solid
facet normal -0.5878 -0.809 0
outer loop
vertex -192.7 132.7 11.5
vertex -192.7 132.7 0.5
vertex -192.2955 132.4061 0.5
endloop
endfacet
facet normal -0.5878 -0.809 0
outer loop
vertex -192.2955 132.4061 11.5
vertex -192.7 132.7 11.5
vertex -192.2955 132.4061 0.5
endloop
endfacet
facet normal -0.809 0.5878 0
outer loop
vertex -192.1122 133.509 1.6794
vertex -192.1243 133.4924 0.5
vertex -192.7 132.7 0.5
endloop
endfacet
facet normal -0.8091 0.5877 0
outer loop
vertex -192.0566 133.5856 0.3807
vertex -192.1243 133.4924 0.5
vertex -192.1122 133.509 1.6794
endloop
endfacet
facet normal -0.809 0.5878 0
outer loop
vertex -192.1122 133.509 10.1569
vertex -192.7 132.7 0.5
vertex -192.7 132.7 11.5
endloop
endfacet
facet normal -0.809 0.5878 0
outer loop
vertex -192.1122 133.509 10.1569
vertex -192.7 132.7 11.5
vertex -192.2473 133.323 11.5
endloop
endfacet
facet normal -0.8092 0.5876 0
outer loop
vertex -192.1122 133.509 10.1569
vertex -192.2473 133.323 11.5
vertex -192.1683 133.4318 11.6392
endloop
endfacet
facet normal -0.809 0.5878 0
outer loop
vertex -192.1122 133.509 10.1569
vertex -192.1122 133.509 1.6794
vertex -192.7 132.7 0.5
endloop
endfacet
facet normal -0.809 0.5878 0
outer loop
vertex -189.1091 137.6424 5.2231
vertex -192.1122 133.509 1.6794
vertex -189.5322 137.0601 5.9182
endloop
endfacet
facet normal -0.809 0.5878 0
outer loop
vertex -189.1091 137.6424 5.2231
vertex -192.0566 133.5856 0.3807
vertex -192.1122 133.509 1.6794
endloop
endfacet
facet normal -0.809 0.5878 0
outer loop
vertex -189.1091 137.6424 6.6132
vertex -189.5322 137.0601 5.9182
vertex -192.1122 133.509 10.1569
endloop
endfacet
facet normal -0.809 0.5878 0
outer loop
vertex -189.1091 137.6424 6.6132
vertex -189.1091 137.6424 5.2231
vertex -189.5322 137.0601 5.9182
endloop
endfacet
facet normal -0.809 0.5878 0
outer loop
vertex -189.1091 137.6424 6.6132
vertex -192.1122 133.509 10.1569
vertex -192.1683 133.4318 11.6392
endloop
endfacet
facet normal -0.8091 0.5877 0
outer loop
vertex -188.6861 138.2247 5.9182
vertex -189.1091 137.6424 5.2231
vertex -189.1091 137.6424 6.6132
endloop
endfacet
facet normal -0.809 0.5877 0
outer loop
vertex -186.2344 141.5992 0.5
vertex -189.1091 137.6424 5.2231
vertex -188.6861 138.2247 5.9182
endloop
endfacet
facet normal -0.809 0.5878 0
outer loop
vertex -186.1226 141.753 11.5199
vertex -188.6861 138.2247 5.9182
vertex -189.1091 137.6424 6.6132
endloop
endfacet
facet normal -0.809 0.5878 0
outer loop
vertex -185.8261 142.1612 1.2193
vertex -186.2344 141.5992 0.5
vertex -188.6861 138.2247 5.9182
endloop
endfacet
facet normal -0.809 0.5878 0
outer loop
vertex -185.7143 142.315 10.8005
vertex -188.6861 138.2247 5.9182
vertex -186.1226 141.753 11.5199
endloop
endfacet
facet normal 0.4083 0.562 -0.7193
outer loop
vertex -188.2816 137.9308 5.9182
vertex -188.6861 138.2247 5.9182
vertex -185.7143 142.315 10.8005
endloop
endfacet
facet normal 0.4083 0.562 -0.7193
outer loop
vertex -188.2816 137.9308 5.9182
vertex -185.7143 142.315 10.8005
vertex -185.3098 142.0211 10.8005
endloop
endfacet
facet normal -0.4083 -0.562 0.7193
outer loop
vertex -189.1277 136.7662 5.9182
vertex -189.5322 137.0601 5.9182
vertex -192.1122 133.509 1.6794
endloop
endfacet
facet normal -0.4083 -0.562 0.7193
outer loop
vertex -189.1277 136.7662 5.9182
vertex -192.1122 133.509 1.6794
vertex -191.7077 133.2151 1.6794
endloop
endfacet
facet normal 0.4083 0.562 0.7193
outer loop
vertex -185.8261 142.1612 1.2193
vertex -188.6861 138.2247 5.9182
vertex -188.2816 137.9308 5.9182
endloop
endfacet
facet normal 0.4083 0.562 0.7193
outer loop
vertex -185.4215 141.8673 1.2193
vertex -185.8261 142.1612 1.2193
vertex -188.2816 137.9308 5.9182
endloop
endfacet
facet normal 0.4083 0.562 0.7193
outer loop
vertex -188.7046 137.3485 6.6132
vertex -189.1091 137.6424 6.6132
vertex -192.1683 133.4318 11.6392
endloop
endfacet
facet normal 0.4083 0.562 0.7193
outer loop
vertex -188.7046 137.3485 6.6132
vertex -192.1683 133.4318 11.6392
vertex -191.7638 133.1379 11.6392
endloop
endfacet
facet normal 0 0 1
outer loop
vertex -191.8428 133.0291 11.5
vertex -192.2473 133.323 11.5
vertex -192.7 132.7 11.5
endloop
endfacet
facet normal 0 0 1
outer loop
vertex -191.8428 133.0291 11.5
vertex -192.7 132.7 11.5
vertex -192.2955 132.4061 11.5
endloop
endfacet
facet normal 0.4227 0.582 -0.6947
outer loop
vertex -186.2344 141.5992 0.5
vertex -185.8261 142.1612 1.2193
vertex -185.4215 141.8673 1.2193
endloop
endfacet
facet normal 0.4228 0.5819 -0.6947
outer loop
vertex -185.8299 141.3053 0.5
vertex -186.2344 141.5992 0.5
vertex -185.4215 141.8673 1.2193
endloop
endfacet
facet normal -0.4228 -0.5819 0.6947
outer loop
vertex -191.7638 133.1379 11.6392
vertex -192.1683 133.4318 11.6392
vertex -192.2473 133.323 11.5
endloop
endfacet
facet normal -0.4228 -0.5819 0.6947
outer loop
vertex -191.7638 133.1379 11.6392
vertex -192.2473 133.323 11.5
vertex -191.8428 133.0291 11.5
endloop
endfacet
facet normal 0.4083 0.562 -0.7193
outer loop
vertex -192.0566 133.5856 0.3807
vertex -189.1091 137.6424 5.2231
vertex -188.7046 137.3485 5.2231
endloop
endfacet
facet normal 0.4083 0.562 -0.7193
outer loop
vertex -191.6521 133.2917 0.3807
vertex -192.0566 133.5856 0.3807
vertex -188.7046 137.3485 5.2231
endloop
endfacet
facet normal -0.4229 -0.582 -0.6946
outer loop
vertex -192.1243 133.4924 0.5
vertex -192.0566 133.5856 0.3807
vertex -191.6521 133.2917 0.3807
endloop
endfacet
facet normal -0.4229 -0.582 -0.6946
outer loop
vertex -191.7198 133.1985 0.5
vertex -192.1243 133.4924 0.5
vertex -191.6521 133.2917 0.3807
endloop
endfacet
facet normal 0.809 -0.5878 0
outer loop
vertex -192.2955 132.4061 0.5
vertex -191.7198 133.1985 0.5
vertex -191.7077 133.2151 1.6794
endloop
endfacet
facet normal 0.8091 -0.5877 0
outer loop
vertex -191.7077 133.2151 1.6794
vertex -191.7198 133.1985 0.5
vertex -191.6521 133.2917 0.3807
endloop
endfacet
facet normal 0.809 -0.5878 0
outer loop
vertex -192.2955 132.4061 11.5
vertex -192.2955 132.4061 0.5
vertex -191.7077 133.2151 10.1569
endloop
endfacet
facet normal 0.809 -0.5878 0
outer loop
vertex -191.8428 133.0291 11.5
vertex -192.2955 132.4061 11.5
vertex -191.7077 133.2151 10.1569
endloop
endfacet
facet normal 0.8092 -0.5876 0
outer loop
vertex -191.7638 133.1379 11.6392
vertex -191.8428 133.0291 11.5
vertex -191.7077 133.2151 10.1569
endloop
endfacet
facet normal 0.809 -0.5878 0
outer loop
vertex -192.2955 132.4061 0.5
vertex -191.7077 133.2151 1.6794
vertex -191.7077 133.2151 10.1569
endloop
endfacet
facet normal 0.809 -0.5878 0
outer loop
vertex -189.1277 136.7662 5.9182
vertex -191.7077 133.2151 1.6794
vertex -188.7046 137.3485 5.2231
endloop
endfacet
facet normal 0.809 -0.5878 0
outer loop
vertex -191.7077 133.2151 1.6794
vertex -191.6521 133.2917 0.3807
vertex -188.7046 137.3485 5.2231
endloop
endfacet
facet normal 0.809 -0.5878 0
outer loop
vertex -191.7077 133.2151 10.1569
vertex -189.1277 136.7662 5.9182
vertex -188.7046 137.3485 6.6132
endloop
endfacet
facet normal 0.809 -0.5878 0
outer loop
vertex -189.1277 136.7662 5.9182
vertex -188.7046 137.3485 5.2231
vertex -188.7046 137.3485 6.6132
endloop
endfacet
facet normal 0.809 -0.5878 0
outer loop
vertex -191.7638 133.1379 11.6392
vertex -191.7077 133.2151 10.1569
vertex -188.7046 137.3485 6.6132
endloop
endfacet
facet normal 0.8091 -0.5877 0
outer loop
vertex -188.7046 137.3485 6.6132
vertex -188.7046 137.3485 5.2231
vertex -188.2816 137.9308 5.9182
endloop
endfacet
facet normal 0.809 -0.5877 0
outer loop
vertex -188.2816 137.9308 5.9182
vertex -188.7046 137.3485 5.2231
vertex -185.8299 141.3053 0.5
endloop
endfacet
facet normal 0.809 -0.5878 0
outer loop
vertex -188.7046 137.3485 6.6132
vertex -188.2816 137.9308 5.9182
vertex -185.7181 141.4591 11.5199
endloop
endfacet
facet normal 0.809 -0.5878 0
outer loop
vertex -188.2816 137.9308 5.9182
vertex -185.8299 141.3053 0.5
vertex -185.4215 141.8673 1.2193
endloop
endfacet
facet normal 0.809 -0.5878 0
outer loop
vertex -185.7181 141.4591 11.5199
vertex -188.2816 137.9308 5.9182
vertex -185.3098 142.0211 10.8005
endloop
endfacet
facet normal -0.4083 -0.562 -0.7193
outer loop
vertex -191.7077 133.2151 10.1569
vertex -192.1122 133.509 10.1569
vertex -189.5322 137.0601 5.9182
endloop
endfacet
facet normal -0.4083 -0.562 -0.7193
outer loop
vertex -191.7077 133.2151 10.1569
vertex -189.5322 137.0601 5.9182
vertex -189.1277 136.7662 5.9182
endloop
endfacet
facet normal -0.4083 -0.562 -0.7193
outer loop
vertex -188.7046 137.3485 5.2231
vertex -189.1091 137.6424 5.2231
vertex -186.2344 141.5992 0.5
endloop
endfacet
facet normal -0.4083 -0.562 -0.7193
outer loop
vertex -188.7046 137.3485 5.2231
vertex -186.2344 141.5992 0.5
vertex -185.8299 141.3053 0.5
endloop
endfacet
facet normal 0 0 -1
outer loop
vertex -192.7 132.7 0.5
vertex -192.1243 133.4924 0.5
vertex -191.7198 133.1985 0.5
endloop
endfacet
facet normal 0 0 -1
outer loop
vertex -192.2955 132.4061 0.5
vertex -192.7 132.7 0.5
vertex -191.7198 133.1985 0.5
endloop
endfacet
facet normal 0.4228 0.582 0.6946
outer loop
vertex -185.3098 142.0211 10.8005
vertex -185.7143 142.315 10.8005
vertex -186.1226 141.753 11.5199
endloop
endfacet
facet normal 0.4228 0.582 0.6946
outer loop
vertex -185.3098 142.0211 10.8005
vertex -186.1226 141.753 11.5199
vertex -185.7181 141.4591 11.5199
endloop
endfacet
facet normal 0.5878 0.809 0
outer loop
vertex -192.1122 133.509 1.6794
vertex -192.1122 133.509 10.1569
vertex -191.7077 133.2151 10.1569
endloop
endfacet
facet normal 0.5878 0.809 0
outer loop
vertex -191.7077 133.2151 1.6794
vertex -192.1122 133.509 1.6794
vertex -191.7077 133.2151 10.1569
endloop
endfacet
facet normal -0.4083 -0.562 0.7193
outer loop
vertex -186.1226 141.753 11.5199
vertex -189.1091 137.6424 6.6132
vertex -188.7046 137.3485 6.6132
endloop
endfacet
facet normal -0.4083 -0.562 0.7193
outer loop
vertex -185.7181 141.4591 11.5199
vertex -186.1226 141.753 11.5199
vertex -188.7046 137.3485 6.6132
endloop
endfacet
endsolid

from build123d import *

# Parameters (mm, degrees)
BOX232_W                  = 0.5
BOX232_H                  = 1
BOX232_DEPTH              = 15
BOX232_ROLL_ANGLE         = 46
BOX233_W                  = 0.5
BOX233_H                  = 1
BOX233_DEPTH              = 15
BOX233_ROLL_ANGLE         = -46
BOX231_W                  = 0.5
BOX231_H                  = 1
BOX231_DEPTH              = 11
FUSION020_PLACEMENT_ANGLE = -36


with BuildPart() as cubo232:
    # Box232 → Box232 (new body)
    with BuildSketch(Plane.XY):
        with Locations((0.25, 0.5)):
            Rectangle(BOX232_W, BOX232_H)
    extrude(amount=BOX232_DEPTH)


with BuildPart() as cubo232_1:
    # Box232 roll: moved
    add(cubo232.part.rotate(Axis((0, 0, 0), (1, 0, 0)), BOX232_ROLL_ANGLE))


with BuildPart() as cubo232_2:
    # Box232 placement: moved
    add(cubo232_1.part.moved(Location((0, 11, 0.5))))


with BuildPart() as cubo233:
    # Box233 → Box233 (new body)
    with BuildSketch(Plane.XY):
        with Locations((0.25, 0.5)):
            Rectangle(BOX233_W, BOX233_H)
    extrude(amount=BOX233_DEPTH)


with BuildPart() as cubo233_1:
    # Box233 roll: moved
    add(cubo233.part.rotate(Axis((0, 0, 0), (1, 0, 0)), BOX233_ROLL_ANGLE))


with BuildPart() as cubo233_2:
    # Box233 placement: moved
    add(cubo233_1.part.moved(Location((0, 0.4, 1.1))))


with BuildPart() as fusion020:
    # Box231 → Box231 (new body)
    with BuildSketch(Plane.XY.offset(0.5)):
        with Locations((0.25, 0.5)):
            Rectangle(BOX231_W, BOX231_H)
    extrude(amount=BOX231_DEPTH)

    # Fusion020: union Cubo232, Cubo233
    add(cubo232_2.part)
    add(cubo233_2.part)


with BuildPart() as fusion020_1:
    # Fusion020 placement: moved
    add(fusion020.part.moved(Location((-192.7, 132.7, 0))).rotate(Axis((-192.7, 132.7, 0), (0, 0, 1)), FUSION020_PLACEMENT_ANGLE))


solid = fusion020_1.part
